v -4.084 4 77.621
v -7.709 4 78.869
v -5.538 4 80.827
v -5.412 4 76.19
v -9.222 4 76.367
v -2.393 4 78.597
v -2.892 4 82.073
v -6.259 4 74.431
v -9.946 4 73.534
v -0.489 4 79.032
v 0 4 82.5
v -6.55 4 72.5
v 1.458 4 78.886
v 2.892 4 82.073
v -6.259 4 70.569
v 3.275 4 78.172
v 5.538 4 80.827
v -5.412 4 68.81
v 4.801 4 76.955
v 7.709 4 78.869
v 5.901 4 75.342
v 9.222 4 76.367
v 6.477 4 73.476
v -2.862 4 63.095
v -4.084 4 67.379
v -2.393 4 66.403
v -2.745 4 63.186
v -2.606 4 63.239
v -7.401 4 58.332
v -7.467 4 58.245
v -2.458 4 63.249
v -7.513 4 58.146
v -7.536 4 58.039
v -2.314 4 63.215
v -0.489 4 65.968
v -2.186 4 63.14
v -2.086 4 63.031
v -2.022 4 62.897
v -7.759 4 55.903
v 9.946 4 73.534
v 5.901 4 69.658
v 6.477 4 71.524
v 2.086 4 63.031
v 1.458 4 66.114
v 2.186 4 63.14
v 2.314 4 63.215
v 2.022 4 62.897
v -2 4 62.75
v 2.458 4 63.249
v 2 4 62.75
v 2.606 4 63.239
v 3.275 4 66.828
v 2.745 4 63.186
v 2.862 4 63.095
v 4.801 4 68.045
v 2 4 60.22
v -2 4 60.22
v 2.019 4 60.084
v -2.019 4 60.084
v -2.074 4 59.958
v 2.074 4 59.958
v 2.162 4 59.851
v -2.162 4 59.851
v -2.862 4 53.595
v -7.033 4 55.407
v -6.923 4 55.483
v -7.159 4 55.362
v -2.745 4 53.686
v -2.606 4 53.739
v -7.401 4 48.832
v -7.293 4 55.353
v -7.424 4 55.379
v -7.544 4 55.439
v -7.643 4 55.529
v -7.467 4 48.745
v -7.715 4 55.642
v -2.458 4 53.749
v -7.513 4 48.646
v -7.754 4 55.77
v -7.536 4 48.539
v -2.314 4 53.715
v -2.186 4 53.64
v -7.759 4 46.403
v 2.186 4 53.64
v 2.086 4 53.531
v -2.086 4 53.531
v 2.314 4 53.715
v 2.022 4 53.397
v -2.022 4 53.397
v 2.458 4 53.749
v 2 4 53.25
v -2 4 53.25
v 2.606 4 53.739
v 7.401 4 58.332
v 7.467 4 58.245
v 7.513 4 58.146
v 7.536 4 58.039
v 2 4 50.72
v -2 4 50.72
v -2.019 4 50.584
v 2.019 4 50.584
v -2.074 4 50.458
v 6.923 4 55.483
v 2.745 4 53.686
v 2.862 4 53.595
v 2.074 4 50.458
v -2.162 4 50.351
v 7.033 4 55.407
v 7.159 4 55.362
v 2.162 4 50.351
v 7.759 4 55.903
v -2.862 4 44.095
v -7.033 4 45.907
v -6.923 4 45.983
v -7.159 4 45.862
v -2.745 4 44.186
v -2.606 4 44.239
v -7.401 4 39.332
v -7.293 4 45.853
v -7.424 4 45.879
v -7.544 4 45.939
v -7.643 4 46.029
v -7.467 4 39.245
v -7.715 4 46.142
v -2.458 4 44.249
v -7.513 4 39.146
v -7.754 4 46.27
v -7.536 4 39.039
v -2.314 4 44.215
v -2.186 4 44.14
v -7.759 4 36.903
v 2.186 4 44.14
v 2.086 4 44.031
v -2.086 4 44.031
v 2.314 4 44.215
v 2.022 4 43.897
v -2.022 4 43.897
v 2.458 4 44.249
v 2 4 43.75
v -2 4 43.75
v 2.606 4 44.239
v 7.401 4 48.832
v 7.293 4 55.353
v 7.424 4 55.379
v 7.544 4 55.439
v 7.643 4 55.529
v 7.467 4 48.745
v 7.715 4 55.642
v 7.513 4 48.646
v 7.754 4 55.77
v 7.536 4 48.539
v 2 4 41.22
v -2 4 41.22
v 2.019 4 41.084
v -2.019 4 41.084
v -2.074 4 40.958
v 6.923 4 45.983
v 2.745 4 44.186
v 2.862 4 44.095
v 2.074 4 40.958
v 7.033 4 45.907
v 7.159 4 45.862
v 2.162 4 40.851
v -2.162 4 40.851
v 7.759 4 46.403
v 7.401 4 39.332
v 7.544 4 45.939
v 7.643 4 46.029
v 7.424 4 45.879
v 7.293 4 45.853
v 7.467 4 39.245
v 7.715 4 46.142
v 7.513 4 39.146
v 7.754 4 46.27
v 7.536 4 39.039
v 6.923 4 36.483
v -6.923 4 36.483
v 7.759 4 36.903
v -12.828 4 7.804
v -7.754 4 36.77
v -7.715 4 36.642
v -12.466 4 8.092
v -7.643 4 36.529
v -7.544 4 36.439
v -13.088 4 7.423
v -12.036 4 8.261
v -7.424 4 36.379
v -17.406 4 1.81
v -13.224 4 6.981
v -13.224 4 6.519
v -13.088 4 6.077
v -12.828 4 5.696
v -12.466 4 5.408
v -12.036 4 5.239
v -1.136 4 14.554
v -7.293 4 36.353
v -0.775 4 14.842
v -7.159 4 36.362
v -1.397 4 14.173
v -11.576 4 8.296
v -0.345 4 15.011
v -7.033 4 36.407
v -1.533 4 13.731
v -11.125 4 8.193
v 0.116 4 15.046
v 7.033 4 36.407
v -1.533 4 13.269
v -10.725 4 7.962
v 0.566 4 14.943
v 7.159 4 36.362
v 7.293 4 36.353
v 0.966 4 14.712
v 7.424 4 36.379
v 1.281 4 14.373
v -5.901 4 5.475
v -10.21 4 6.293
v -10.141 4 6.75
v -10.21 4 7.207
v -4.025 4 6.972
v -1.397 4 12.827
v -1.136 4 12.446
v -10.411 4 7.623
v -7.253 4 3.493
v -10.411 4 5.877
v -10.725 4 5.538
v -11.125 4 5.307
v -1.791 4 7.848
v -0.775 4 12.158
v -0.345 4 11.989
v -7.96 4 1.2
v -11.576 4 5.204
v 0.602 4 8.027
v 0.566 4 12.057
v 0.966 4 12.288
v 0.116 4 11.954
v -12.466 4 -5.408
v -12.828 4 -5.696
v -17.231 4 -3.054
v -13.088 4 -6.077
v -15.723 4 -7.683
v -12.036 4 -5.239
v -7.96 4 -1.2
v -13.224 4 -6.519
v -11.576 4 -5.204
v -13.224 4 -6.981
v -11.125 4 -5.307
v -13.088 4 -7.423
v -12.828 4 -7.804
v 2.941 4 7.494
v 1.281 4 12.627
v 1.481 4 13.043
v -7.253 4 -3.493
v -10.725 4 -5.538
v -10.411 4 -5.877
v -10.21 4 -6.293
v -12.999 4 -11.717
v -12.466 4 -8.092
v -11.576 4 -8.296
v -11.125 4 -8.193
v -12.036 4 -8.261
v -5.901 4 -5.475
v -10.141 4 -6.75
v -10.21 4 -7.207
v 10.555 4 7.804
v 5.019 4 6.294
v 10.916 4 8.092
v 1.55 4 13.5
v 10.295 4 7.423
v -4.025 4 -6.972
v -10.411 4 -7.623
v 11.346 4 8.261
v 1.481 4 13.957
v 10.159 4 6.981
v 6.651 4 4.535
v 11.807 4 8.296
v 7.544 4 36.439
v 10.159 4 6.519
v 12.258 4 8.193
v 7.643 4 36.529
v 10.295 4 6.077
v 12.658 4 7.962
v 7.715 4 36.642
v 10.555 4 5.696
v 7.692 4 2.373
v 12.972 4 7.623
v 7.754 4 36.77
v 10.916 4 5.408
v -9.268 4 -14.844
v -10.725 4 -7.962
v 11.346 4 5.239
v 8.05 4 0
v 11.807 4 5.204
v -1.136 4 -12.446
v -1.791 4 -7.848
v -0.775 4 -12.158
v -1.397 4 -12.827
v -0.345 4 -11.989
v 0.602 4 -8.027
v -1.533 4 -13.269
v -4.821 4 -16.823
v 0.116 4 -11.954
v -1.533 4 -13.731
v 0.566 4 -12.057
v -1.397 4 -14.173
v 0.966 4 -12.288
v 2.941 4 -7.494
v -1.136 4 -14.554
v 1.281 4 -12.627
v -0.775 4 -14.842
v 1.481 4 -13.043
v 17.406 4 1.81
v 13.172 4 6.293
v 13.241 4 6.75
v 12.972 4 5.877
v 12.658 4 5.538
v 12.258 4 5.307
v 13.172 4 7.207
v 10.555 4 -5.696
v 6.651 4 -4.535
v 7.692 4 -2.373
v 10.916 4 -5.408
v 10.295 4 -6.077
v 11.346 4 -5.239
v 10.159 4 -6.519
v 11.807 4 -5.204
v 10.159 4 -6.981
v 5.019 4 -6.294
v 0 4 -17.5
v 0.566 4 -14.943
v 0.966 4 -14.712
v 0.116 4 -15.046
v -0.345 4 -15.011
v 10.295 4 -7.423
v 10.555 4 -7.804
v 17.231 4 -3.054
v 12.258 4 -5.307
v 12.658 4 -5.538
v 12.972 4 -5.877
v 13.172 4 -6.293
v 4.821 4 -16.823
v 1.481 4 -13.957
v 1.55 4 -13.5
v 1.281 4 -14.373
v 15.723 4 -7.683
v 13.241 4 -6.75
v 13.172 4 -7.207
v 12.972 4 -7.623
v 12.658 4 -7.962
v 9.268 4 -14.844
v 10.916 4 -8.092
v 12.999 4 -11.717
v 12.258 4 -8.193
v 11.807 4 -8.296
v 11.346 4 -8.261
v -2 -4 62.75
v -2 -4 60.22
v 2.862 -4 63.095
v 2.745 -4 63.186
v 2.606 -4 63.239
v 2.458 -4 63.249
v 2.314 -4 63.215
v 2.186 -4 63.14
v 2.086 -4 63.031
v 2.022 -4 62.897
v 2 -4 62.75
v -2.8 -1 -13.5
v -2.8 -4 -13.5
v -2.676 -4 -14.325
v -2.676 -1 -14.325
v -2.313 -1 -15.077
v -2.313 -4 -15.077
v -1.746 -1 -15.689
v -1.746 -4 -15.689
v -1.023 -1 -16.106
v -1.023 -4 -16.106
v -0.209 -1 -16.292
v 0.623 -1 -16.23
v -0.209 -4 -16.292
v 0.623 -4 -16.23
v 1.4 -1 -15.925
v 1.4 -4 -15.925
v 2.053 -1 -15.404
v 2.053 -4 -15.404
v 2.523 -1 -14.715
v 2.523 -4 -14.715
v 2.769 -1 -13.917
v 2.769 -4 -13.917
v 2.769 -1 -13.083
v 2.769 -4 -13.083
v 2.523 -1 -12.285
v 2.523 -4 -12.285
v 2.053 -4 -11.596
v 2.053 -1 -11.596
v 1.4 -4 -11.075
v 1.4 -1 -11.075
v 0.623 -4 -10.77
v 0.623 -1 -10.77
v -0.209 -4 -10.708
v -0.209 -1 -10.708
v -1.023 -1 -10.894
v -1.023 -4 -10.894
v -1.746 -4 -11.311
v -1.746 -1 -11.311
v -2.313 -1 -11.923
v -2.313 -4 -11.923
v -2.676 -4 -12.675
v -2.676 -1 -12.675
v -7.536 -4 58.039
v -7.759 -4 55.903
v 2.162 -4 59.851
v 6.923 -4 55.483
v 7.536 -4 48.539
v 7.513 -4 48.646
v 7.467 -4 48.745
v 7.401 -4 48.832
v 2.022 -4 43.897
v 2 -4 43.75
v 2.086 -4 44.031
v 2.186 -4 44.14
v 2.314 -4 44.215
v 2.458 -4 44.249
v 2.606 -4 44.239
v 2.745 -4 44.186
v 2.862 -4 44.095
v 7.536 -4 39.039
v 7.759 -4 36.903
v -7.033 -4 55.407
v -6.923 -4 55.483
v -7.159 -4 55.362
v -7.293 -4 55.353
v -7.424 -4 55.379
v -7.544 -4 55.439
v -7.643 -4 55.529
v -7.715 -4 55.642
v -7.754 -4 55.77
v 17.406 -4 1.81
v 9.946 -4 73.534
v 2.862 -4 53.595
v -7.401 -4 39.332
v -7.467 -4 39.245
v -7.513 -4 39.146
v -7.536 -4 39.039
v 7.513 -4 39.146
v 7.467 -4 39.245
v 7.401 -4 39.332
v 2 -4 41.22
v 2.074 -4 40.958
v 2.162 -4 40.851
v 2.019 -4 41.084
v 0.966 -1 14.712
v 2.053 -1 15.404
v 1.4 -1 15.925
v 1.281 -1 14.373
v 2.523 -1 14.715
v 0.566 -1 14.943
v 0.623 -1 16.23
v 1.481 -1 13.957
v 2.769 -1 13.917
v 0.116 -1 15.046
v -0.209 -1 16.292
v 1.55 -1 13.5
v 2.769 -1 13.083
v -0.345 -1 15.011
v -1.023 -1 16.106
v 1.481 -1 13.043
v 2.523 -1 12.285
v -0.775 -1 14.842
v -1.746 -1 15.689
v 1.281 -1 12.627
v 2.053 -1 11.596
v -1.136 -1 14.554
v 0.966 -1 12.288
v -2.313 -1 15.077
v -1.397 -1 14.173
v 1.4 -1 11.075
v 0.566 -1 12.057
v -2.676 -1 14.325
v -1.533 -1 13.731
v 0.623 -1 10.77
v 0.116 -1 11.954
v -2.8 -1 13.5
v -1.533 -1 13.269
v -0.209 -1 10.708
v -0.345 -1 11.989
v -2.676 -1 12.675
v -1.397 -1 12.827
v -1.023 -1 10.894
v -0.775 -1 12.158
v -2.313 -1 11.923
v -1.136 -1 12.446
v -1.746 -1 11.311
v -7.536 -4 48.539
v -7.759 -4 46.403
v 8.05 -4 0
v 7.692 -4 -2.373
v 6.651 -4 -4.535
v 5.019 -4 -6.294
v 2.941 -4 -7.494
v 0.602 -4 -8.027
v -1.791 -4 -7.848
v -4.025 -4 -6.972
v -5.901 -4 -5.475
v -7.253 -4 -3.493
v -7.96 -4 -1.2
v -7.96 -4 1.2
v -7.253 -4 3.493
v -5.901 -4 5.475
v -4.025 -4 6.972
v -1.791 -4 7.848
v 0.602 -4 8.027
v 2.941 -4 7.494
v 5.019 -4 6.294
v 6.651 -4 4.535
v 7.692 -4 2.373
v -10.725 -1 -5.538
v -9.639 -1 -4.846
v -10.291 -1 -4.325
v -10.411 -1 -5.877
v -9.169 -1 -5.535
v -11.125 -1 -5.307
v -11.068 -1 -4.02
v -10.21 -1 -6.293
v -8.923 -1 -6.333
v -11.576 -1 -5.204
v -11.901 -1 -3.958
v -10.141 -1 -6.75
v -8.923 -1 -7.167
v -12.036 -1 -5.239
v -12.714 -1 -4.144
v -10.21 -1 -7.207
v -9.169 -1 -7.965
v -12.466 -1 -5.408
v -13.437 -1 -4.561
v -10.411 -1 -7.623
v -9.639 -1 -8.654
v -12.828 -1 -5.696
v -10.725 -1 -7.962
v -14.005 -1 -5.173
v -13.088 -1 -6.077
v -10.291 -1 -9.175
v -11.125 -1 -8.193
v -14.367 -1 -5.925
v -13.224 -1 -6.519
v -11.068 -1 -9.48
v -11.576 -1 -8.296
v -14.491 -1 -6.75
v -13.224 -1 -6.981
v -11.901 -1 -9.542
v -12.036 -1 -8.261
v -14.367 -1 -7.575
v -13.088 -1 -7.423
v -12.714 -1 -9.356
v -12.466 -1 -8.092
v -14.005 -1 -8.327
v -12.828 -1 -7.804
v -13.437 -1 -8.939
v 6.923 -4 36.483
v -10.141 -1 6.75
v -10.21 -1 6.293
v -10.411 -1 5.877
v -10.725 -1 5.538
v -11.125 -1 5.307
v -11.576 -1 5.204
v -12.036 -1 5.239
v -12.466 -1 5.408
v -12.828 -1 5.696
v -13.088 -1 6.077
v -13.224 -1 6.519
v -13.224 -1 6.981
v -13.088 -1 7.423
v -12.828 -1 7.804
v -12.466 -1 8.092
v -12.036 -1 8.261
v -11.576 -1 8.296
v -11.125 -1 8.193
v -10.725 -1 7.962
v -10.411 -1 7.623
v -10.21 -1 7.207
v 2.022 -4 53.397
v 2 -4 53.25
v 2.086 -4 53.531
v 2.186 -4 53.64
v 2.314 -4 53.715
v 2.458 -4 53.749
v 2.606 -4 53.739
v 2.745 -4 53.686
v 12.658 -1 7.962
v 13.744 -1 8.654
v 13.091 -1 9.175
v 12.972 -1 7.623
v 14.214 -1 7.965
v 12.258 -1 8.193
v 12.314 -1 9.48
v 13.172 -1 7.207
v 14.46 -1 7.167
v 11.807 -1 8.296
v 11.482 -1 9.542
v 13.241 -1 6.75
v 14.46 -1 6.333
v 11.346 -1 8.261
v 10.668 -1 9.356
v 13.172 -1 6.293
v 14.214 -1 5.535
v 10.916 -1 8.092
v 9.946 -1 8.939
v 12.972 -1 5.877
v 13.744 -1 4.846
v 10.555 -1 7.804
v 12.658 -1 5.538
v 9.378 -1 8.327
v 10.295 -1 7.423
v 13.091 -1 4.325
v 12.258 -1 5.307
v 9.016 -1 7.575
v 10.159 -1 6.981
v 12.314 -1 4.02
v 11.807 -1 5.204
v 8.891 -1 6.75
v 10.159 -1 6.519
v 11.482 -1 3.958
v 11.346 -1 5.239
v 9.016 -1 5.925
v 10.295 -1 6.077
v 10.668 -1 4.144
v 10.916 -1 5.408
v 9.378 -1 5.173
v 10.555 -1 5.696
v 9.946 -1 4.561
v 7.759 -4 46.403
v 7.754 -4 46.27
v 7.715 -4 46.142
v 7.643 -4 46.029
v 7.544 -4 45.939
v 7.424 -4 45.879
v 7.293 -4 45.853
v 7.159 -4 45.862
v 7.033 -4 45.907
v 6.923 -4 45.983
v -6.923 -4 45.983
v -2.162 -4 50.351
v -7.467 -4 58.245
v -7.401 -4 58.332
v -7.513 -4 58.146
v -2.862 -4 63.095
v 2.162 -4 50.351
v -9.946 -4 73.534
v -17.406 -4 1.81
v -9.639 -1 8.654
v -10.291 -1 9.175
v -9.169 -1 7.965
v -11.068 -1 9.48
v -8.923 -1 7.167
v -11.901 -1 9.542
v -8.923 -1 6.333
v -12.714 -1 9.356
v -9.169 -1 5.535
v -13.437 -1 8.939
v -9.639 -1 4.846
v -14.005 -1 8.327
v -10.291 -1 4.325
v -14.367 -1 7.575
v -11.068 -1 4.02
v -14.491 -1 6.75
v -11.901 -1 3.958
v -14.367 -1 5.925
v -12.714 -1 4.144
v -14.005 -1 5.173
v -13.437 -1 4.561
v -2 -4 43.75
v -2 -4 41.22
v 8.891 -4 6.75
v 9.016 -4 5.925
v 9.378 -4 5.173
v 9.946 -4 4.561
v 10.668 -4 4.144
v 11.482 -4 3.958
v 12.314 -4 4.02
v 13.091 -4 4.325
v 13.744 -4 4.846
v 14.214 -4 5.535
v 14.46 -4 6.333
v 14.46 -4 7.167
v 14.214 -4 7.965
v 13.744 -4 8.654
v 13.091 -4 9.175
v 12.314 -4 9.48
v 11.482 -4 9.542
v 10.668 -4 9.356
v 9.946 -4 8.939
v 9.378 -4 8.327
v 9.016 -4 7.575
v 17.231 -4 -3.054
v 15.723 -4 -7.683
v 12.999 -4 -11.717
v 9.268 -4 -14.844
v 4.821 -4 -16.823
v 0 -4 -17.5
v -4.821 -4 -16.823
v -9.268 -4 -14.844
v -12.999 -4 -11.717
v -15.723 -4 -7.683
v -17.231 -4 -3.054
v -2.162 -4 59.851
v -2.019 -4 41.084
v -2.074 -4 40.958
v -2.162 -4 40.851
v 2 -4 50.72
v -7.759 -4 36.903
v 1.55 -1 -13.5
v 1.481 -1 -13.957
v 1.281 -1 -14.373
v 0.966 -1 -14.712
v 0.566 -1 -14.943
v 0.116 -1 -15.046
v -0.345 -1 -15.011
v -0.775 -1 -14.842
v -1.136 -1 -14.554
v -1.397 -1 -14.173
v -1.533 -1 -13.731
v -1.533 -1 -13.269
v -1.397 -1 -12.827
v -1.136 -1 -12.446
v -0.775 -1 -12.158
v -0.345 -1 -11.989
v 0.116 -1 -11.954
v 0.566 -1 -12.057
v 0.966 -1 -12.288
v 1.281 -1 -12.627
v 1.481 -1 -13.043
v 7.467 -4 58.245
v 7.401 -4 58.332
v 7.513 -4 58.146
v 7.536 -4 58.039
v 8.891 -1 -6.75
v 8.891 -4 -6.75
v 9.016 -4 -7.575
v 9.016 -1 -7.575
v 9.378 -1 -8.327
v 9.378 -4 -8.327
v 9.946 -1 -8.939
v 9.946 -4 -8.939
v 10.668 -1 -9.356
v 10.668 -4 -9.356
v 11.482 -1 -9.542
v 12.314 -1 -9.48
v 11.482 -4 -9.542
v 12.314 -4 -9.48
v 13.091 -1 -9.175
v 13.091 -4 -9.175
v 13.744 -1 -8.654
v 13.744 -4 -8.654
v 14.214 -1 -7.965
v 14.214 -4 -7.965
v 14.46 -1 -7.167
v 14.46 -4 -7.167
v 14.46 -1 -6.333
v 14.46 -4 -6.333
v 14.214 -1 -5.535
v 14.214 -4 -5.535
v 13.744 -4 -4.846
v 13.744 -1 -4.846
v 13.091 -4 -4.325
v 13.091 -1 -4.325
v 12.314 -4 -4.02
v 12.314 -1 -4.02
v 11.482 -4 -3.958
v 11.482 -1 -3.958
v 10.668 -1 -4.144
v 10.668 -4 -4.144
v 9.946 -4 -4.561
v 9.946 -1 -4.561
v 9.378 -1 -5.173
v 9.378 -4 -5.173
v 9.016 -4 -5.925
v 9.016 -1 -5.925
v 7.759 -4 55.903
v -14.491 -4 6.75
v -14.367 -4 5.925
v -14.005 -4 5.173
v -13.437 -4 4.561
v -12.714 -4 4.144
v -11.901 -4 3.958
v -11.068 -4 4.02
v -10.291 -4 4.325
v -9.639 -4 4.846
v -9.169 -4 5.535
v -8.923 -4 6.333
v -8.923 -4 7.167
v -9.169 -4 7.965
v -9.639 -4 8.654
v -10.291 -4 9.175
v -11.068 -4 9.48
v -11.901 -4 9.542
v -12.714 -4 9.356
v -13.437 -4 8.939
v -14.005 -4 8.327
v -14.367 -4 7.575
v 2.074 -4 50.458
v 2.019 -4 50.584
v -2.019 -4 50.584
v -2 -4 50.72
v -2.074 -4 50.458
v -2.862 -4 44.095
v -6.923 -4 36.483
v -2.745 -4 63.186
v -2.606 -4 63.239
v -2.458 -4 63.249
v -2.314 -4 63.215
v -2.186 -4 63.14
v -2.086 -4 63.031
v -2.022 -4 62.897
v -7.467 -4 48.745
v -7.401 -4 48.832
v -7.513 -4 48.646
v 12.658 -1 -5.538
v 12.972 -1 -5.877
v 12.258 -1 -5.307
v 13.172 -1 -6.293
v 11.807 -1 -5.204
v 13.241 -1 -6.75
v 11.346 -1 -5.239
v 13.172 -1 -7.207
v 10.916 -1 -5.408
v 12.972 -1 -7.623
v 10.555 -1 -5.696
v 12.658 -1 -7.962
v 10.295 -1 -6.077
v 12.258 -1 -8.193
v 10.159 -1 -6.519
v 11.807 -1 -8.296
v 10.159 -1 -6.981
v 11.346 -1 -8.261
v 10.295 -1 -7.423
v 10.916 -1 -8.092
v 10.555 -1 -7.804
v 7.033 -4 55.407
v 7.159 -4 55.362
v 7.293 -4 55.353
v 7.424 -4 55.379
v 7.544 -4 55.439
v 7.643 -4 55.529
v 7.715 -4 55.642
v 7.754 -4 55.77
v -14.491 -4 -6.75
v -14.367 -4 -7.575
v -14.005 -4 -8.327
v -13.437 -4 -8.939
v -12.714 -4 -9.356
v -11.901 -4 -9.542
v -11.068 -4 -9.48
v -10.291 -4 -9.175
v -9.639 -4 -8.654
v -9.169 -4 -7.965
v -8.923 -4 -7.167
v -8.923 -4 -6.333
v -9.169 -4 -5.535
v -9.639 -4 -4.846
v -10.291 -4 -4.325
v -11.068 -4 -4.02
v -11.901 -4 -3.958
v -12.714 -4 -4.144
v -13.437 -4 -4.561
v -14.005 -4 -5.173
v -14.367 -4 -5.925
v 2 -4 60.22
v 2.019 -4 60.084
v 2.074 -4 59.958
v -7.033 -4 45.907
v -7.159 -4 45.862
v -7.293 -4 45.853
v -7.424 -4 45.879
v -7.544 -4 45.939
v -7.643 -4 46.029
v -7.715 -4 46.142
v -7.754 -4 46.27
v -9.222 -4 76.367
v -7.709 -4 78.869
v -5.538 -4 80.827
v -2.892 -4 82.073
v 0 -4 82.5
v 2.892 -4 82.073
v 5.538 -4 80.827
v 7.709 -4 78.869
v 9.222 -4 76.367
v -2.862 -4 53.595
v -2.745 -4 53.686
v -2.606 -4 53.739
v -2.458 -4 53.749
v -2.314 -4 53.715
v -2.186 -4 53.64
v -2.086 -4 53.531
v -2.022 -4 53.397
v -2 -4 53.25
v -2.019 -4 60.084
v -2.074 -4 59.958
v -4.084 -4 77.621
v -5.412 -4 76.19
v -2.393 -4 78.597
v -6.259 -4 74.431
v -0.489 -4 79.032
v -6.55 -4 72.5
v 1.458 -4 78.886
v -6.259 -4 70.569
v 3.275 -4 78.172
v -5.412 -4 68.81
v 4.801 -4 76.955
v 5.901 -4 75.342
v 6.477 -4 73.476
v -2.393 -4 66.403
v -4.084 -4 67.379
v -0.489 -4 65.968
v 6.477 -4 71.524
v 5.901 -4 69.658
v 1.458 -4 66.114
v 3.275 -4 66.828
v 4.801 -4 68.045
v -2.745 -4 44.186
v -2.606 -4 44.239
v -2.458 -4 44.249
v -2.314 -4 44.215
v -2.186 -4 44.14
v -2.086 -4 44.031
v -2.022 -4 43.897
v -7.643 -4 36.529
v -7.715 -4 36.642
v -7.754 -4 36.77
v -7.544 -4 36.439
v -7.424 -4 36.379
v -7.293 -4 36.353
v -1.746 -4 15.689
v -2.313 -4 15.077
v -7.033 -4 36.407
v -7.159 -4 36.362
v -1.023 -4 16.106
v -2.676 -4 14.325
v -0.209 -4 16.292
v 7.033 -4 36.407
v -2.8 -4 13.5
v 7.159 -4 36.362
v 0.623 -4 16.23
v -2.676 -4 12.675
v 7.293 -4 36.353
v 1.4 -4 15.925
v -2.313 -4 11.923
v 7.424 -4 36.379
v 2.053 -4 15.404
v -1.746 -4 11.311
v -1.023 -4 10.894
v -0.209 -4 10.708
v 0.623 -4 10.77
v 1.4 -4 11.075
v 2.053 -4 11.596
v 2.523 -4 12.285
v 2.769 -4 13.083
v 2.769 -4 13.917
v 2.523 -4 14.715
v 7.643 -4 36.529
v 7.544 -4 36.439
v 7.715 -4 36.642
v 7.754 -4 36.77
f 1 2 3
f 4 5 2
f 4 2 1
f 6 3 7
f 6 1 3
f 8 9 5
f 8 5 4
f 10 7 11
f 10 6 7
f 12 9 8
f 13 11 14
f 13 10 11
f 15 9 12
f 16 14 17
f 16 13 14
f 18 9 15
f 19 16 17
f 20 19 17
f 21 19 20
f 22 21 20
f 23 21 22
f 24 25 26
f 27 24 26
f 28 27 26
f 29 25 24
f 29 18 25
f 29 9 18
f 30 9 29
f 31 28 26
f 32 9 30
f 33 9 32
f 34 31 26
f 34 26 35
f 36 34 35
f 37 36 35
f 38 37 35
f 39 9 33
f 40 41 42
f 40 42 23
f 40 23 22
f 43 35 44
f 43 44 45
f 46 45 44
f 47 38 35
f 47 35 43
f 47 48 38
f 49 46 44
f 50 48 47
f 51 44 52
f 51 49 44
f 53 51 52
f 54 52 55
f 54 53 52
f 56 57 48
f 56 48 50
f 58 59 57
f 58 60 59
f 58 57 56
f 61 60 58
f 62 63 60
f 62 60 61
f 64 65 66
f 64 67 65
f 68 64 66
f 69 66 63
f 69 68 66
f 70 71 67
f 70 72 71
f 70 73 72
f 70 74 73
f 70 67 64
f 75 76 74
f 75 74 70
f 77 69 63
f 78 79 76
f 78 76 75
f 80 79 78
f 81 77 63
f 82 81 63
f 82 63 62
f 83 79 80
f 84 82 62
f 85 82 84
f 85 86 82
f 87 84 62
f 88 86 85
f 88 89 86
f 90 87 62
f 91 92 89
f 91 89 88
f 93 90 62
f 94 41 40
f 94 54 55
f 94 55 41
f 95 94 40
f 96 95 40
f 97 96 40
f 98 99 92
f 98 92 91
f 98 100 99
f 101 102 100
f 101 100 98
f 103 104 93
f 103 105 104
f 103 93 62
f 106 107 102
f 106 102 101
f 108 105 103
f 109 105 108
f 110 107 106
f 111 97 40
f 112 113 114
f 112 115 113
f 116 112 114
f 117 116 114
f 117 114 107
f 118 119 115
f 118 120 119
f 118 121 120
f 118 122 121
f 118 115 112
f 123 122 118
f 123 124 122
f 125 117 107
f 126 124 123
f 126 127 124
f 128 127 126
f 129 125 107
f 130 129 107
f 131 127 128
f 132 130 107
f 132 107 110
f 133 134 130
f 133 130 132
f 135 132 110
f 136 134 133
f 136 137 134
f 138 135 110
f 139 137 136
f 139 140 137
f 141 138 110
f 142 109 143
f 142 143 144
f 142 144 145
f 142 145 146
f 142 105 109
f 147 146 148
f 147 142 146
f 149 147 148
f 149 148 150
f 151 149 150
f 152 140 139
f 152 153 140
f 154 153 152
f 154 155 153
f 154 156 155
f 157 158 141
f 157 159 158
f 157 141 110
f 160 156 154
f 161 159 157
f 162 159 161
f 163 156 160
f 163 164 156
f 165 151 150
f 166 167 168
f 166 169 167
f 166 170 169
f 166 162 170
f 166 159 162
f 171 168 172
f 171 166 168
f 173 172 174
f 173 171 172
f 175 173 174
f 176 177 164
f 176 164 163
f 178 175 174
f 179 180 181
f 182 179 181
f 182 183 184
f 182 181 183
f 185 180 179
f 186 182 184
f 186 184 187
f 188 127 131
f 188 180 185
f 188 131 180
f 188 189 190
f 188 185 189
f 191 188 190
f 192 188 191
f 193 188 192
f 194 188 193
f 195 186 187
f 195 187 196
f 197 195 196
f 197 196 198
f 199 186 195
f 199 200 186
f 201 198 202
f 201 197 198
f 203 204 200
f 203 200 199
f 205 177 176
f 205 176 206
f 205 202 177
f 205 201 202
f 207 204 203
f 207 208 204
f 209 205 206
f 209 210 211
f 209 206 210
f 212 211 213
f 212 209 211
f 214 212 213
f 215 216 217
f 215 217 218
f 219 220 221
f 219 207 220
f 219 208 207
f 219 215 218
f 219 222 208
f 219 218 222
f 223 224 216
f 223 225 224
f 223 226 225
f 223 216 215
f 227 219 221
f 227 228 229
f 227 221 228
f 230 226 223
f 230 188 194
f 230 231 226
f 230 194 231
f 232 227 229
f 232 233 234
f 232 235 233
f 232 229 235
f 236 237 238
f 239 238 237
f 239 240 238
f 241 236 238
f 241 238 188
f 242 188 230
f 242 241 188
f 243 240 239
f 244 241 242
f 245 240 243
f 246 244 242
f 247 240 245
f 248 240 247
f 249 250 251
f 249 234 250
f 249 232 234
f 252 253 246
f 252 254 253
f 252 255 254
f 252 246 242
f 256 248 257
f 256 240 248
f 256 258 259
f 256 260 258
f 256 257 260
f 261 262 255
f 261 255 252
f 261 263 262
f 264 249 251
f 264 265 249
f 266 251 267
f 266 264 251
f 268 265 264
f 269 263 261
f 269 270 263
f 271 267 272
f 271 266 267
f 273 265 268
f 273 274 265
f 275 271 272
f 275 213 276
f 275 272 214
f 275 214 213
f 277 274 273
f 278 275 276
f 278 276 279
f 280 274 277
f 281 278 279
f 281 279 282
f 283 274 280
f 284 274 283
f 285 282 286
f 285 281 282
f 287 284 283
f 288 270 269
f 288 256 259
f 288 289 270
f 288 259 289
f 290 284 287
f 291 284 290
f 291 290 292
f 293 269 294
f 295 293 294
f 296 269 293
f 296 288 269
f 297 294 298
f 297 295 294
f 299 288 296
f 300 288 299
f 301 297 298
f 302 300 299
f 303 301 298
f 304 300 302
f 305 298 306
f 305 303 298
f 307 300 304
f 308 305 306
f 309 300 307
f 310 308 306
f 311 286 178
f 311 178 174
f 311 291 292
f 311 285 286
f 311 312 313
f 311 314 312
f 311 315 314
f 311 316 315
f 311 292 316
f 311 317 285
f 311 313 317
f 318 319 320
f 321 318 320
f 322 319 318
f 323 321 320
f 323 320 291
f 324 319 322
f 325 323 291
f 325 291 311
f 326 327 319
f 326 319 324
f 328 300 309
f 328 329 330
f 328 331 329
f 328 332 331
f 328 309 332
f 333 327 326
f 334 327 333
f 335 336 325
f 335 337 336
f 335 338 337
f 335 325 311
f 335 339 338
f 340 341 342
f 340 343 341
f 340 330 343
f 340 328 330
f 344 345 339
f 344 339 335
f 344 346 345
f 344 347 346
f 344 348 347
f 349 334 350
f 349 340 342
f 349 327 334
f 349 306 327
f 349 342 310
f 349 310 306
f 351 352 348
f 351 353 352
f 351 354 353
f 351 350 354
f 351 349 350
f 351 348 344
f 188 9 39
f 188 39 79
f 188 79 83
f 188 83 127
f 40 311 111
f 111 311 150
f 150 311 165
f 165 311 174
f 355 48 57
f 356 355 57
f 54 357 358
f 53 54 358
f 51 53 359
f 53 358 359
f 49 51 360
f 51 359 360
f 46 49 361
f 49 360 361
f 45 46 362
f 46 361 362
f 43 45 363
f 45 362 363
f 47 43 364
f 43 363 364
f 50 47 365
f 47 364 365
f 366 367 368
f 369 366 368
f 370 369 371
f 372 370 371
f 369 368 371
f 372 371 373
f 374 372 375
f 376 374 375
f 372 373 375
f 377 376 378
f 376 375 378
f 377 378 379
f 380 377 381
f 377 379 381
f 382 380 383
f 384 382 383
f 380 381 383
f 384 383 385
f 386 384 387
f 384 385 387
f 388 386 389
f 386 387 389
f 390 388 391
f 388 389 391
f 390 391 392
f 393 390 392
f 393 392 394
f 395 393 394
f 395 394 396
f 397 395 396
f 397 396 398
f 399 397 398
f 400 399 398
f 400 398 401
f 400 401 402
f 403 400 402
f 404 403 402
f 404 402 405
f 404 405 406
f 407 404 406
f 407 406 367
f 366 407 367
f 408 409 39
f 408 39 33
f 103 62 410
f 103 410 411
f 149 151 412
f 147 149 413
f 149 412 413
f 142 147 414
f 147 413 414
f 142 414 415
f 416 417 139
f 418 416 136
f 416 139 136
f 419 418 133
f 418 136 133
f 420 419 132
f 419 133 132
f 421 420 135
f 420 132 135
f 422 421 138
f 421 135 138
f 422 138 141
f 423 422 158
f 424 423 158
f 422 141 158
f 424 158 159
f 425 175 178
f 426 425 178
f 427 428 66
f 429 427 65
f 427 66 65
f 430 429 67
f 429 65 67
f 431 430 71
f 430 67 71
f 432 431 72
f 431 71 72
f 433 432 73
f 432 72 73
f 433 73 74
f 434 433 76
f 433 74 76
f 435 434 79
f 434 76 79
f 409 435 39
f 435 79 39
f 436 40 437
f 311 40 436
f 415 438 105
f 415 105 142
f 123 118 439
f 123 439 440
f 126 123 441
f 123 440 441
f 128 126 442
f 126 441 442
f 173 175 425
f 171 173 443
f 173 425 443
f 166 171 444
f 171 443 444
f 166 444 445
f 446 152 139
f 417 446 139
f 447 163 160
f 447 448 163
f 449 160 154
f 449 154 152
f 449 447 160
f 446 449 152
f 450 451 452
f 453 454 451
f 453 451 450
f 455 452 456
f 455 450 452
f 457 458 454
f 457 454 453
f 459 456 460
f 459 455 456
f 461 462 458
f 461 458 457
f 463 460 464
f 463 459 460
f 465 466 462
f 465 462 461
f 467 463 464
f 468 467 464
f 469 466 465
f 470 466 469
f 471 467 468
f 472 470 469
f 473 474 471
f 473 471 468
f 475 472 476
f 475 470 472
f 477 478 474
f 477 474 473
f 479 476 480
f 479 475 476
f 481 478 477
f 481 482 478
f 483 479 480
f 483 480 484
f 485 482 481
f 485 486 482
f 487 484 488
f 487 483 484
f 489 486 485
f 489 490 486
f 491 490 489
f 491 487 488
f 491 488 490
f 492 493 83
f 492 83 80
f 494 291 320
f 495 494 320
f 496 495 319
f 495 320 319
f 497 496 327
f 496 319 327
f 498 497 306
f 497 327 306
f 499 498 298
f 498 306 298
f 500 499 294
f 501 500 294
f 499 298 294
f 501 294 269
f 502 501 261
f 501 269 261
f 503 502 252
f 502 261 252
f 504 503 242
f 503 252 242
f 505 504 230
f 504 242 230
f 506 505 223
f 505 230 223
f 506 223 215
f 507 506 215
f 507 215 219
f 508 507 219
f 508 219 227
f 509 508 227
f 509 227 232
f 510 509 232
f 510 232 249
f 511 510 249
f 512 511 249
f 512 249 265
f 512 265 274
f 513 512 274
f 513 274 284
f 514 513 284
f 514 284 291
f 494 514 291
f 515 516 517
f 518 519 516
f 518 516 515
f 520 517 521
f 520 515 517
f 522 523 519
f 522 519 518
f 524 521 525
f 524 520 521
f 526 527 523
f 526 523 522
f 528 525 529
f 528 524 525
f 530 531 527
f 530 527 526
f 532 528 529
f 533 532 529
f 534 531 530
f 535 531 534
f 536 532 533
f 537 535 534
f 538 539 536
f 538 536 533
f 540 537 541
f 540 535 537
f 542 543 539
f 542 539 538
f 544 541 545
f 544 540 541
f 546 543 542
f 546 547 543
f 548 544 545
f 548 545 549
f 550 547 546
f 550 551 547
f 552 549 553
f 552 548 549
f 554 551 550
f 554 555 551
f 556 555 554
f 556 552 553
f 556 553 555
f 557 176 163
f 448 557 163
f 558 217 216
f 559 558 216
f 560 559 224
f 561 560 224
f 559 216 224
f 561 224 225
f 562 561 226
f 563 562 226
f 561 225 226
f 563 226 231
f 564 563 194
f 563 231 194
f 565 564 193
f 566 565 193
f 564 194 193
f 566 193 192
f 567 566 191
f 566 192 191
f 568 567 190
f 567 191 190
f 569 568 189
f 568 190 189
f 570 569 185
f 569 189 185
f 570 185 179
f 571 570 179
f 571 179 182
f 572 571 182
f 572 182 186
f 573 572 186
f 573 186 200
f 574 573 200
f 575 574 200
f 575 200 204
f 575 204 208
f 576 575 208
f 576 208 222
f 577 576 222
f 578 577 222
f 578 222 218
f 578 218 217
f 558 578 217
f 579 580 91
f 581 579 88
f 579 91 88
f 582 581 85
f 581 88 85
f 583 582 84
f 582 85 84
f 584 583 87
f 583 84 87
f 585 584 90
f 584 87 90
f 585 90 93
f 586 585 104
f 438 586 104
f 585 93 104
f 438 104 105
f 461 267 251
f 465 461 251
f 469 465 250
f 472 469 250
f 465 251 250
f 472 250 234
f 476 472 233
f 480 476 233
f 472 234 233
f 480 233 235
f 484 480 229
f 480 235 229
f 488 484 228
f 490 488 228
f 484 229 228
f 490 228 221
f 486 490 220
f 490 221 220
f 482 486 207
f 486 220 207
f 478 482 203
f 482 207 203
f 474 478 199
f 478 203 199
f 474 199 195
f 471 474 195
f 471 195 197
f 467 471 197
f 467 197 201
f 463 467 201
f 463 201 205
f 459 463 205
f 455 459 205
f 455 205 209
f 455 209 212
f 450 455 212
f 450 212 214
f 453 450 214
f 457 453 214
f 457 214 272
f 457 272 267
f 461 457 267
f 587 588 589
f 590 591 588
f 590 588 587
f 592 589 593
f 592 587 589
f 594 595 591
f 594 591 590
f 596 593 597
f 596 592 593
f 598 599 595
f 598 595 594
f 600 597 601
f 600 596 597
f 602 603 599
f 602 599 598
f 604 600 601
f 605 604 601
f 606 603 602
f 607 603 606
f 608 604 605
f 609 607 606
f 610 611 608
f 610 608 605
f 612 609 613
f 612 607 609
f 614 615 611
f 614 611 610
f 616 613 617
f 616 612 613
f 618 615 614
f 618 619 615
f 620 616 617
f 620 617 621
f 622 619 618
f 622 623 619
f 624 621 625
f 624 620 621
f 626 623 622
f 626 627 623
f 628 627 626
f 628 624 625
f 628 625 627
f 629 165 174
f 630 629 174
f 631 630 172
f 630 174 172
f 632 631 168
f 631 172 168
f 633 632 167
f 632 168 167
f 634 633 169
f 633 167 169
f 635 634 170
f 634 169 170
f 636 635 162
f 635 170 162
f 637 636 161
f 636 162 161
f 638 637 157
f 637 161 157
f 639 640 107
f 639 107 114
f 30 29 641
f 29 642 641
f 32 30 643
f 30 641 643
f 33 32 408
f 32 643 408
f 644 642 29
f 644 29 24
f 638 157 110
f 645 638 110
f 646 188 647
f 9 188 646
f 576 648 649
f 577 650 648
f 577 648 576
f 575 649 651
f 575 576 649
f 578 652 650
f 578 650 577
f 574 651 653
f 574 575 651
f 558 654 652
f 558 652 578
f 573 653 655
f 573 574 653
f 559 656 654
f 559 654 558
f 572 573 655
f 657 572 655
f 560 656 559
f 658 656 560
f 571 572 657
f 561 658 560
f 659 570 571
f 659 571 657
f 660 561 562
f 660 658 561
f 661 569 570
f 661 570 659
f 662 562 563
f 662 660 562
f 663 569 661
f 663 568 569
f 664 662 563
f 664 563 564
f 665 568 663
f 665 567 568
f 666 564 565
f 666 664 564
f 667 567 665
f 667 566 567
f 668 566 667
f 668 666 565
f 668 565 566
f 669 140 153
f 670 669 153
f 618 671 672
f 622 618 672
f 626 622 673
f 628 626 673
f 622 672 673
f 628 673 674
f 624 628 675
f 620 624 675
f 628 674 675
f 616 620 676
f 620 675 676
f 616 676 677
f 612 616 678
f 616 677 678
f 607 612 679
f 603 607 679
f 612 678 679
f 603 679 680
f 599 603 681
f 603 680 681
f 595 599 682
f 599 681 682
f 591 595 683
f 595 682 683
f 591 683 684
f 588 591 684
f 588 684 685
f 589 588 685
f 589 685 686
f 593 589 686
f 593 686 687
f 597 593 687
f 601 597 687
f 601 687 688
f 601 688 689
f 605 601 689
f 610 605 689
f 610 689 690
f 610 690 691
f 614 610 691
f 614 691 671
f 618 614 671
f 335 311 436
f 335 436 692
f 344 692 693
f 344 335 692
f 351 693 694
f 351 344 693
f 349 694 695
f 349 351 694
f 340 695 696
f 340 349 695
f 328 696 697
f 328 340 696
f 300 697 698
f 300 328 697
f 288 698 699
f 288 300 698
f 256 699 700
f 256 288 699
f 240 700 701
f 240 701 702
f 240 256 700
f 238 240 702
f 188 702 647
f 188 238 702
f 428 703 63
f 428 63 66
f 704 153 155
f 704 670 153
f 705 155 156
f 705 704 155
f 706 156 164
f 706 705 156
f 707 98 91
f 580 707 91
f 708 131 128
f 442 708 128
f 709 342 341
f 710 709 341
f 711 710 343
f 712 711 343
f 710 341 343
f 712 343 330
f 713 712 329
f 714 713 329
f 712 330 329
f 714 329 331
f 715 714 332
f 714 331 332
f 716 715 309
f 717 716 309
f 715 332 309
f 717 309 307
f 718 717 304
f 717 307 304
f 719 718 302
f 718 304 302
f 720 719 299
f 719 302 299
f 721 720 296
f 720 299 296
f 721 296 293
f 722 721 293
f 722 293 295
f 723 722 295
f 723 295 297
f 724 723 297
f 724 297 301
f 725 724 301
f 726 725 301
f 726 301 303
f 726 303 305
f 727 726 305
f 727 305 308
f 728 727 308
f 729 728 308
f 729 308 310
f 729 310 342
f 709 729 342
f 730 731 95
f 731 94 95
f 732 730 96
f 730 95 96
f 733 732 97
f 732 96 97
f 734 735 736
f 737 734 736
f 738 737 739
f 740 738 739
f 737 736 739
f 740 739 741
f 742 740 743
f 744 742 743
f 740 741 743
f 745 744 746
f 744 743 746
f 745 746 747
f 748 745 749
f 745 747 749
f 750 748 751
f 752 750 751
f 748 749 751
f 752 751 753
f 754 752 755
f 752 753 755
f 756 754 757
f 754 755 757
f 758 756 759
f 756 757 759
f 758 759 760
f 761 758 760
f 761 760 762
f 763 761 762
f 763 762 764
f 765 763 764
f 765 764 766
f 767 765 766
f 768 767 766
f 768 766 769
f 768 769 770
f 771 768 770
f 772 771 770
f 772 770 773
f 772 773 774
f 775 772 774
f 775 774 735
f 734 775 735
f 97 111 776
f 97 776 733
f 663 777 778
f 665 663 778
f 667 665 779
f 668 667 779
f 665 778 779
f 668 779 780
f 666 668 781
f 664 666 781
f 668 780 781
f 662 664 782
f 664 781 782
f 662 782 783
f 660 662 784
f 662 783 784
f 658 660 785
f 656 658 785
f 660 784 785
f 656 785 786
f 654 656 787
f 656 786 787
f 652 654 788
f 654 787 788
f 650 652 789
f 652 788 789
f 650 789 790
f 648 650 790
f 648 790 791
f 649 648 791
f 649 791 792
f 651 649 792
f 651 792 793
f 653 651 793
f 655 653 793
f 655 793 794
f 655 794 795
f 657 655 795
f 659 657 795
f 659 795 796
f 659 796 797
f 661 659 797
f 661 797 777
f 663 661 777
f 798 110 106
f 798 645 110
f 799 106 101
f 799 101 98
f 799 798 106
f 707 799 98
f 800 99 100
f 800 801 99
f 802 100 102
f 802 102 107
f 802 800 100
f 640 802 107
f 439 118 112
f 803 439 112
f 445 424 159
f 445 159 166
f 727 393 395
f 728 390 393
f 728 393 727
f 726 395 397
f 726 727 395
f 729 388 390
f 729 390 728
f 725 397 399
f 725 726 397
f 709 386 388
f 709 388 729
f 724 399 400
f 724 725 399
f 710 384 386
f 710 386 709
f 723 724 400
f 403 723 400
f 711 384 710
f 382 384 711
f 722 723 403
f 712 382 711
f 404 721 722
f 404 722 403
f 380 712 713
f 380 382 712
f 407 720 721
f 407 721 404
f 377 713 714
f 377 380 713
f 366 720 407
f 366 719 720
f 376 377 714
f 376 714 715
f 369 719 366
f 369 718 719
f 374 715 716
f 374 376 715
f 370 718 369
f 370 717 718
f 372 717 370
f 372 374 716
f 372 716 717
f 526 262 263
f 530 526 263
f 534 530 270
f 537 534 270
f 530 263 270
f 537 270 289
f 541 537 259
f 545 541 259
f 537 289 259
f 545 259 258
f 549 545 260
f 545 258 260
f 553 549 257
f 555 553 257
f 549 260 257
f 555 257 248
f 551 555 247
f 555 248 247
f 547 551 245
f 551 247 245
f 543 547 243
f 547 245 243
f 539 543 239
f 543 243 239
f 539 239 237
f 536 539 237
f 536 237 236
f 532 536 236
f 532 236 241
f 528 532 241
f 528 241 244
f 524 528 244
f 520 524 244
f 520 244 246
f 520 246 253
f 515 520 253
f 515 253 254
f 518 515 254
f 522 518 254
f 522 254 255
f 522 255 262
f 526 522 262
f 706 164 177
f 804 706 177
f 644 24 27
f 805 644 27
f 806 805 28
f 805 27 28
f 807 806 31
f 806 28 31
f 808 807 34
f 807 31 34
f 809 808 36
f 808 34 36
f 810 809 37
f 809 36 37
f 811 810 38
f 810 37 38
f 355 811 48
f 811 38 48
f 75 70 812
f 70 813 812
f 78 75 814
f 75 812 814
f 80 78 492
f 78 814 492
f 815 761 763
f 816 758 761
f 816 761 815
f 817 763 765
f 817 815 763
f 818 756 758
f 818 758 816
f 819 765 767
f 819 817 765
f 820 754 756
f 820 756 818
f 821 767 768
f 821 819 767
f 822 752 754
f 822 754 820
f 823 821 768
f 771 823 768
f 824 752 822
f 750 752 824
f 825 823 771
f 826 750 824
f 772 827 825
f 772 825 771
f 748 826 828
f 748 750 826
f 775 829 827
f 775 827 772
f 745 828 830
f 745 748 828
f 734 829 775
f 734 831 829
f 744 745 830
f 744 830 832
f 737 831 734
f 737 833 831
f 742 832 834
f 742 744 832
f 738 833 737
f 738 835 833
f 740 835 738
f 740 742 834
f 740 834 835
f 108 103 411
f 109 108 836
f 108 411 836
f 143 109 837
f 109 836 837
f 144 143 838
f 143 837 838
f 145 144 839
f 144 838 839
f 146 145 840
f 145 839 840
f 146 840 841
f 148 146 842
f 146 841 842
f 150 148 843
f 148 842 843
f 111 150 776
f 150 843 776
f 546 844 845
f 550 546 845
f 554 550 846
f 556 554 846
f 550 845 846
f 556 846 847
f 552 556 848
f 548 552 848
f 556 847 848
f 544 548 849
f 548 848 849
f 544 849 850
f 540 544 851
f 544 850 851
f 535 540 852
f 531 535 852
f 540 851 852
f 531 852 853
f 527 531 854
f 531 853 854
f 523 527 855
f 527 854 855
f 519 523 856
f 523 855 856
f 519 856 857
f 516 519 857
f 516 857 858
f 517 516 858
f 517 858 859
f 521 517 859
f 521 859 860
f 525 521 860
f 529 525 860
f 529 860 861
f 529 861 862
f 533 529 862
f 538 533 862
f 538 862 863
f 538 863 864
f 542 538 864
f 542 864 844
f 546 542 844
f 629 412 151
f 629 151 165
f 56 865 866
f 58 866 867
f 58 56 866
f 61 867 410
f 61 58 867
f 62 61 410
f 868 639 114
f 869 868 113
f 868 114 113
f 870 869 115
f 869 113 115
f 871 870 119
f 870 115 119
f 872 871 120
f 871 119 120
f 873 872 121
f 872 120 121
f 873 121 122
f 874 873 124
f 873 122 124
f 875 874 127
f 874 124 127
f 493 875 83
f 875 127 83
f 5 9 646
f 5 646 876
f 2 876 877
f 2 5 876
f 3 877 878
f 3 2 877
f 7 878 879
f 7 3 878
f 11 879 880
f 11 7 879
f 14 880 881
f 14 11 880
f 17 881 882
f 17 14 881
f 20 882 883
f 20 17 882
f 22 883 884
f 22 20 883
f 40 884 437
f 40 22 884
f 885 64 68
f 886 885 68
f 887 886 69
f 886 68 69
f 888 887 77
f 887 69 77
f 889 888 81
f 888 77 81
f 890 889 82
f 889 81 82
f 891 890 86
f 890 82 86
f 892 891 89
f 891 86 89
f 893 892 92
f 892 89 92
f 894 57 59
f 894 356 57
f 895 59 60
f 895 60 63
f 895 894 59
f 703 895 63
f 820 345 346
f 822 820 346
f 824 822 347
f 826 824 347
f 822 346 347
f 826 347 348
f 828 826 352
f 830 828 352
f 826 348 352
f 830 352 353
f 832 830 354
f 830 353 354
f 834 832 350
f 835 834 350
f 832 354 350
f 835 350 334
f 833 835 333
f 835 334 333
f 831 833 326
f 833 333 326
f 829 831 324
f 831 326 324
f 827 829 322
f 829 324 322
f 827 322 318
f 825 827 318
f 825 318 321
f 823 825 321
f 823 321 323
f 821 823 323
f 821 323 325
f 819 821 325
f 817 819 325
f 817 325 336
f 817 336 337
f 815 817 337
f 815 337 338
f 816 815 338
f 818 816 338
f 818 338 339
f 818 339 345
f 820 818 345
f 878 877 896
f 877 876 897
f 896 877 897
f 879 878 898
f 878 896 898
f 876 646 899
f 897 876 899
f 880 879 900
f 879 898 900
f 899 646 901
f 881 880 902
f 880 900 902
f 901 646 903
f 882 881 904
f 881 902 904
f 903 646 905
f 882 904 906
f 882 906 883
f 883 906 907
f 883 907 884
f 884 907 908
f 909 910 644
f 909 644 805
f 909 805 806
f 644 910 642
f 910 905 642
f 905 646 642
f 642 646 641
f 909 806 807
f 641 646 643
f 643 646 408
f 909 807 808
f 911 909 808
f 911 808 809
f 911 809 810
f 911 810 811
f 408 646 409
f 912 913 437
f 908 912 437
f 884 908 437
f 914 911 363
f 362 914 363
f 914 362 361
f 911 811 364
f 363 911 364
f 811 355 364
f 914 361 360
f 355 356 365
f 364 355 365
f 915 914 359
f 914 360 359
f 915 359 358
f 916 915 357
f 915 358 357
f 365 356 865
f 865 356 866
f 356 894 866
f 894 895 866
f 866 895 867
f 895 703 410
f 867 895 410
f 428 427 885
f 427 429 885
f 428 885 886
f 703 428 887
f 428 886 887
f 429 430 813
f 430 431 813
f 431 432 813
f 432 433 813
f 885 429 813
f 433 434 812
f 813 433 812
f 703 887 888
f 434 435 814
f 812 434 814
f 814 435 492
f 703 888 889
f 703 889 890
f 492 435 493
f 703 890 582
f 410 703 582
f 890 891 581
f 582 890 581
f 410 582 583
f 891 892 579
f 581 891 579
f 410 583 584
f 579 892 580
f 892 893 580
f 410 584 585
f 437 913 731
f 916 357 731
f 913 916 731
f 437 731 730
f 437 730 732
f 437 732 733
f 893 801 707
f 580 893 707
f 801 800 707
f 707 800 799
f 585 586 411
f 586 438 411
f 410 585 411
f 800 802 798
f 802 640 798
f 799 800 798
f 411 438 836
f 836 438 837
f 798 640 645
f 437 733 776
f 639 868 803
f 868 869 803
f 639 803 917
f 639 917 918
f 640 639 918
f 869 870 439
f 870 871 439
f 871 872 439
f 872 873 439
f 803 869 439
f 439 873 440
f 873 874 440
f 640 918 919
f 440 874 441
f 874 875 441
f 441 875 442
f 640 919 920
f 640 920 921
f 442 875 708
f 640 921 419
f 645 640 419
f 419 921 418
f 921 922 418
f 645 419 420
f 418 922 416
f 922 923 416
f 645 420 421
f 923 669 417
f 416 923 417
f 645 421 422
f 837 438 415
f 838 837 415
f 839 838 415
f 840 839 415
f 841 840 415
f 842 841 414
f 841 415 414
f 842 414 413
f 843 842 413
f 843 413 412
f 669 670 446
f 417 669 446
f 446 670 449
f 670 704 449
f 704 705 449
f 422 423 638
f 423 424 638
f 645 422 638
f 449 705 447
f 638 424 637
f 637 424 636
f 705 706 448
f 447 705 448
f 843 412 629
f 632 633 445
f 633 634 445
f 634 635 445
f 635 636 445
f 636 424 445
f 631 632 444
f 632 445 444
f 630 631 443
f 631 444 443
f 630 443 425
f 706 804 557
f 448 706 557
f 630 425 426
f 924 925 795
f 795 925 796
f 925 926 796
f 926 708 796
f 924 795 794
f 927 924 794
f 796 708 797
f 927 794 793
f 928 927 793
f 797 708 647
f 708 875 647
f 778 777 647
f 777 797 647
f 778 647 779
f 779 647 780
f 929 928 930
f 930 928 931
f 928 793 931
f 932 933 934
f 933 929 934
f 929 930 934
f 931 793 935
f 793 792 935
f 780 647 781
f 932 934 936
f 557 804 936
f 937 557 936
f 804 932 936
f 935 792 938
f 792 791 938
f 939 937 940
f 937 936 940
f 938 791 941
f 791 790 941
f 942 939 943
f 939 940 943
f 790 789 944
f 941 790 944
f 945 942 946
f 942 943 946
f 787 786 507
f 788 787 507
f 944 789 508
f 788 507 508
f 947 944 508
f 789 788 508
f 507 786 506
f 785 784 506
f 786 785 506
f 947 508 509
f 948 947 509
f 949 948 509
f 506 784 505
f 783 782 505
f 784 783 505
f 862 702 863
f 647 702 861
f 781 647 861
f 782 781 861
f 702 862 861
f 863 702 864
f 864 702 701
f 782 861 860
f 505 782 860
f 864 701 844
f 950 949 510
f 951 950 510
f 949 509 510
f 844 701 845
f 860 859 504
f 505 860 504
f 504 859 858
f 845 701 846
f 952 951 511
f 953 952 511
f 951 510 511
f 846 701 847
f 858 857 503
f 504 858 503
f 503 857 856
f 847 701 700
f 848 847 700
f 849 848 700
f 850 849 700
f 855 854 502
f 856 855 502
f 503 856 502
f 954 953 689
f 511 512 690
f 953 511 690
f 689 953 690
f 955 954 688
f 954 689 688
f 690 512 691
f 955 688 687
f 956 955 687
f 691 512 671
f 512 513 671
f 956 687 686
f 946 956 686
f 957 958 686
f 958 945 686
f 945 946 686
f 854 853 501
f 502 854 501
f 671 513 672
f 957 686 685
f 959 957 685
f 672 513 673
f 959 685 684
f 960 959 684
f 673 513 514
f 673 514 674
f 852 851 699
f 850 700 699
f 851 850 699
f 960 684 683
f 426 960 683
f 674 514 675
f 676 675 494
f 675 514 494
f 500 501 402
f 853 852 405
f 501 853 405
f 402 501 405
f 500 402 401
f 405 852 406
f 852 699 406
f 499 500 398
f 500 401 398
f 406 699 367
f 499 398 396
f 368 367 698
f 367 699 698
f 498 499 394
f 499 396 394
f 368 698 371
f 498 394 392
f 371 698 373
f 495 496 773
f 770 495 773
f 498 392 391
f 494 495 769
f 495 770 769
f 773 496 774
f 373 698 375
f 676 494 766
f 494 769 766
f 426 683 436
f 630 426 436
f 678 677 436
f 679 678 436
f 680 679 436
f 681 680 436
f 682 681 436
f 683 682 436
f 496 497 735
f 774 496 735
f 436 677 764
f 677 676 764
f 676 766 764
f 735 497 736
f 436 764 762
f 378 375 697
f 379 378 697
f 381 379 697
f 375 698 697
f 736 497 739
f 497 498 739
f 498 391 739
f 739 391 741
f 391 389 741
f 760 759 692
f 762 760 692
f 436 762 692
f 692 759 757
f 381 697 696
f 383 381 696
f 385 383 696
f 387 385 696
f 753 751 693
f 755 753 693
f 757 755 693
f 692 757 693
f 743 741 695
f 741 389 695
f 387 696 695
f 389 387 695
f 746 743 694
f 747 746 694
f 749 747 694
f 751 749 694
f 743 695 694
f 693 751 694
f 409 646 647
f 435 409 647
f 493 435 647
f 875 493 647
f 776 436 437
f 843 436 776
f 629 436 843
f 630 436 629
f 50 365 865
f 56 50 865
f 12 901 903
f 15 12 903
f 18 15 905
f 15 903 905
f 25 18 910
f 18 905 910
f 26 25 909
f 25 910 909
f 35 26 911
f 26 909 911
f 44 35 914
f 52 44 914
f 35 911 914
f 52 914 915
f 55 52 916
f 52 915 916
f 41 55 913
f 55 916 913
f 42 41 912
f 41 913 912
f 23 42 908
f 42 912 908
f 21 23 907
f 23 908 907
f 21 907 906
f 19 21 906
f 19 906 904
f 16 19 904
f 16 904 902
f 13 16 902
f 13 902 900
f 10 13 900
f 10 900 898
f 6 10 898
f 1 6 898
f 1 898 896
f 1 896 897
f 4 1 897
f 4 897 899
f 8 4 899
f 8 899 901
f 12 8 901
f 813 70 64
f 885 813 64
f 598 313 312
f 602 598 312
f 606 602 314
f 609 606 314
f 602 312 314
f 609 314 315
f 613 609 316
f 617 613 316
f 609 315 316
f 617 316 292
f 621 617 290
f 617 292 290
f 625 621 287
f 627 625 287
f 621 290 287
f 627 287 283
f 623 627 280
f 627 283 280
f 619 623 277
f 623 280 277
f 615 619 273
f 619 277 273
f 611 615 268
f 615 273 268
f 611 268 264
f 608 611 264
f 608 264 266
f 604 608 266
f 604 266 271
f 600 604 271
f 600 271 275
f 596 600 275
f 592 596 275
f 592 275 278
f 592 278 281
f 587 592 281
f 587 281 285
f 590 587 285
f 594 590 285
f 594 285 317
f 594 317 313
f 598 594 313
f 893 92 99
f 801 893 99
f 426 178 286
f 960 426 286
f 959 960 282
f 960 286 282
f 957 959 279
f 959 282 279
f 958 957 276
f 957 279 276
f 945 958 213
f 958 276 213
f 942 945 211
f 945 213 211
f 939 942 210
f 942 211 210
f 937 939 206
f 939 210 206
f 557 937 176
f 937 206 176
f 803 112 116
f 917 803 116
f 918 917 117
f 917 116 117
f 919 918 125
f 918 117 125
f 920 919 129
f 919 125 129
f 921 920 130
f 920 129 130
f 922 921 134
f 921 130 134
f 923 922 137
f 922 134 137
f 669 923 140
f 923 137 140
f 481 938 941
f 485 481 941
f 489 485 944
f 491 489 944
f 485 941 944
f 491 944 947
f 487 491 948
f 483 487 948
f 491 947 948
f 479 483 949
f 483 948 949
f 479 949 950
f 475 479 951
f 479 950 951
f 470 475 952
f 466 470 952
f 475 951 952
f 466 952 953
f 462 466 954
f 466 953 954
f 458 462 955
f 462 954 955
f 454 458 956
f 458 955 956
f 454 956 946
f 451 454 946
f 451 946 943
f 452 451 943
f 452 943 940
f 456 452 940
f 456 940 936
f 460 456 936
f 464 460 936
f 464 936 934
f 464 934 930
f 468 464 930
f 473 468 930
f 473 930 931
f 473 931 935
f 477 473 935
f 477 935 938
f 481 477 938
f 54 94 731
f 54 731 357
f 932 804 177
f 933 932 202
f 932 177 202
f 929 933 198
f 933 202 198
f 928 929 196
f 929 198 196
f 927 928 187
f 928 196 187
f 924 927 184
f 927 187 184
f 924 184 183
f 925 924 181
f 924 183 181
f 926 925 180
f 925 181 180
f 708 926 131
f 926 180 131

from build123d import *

# Parameters (mm, degrees)
EXTRUDE_1_DEPTH                = 8
CUT_EXTRUDE_1_DEPTH            = 9
CUT_EXTRUDE_2_DEPTH            = 9
CUT_EXTRUDE_3_DEPTH            = 9
CUT_EXTRUDE_4_DEPTH            = 9
CUT_EXTRUDE_5_DEPTH            = 9
CUT_EXTRUDE_6_DEPTH            = 9
HOLE_WIZARD_16_0_16_1_D        = 16.1
HOLE_WIZARD_16_0_16_1_DEPTH    = 8
HOLE_WIZARD_13_0_13_1_D        = 13.1
HOLE_WIZARD_13_0_13_1_DEPTH    = 8
HOLE_WIZARD_M2_5_1_D           = 3.1
HOLE_WIZARD_M2_5_1_DEPTH       = 8
HOLE_WIZARD_M2_5_1_CBORE_D     = 5.6
HOLE_WIZARD_M2_5_1_CBORE_DEPTH = 3
FILLET_1_R                     = 0.5


with BuildPart() as part:
    # 草图1 → 凸台-拉伸1 (new body)
    with BuildSketch(Plane(origin=(0, 4, 0), x_dir=(1, 0, 0), z_dir=(0, 1, 0))):
        with BuildLine():
            Line((-17.406109606, -1.810344828), (-9.946348346, -73.534482759))
            ThreePointArc((-9.946348346, -73.534482759), (0, -82.5), (9.946348346, -73.534482759))
            Line((9.946348346, -73.534482759), (17.406109606, -1.810344828))
            ThreePointArc((17.406109606, -1.810344828), (0, 17.5), (-17.406109606, -1.810344828))
        make_face()
    extrude(amount=-EXTRUDE_1_DEPTH)

    # 草图2 → 切除-拉伸1 (cut, through all)
    with BuildSketch(Plane(origin=(0, 4, 0), x_dir=(-1, 0, 0), z_dir=(0, 1, 0))):
        with BuildLine():
            Line((2, 43.750482659), (2, 41))
            Line((2, 41), (6.923179382, 36.483241979))
            ThreePointArc((6.923179382, 36.483241979), (7.485869271, 36.40499598), (7.758515386, 36.903399876))
            Line((7.758515386, 36.903399876), (7.518784371, 39.208366459))
            Line((7.518784371, 39.208366459), (2.861977096, 44.095406683))
            ThreePointArc((2.861977096, 44.095406683), (2.314242831, 44.214696268), (2, 43.750482659))
        make_face()
    extrude(amount=-CUT_EXTRUDE_1_DEPTH, mode=Mode.SUBTRACT)

    # 草图3 → 切除-拉伸2 (cut, through all)
    with BuildSketch(Plane(origin=(0, 4, 0), x_dir=(-1, 0, 0), z_dir=(0, 1, 0))):
        with BuildLine():
            Line((-6.923179382, 36.483241979), (-2, 41))
            Line((-2, 41), (-2, 43.750482659))
            ThreePointArc((-2, 43.750482659), (-2.314242831, 44.214696268), (-2.861977096, 44.095406683))
            Line((-2.861977096, 44.095406683), (-7.518784371, 39.208366459))
            Line((-7.518784371, 39.208366459), (-7.758515386, 36.903399876))
            ThreePointArc((-7.758515386, 36.903399876), (-7.485869271, 36.40499598), (-6.923179382, 36.483241979))
        make_face()
    extrude(amount=-CUT_EXTRUDE_2_DEPTH, mode=Mode.SUBTRACT)

    # 草图4 → 切除-拉伸3 (cut, through all)
    with BuildSketch(Plane(origin=(0, 4, 0), x_dir=(-1, 0, 0), z_dir=(0, 1, 0))):
        with BuildLine():
            Line((2, 53.250482659), (2, 50.5))
            Line((2, 50.5), (6.923179382, 45.983241979))
            ThreePointArc((6.923179382, 45.983241979), (7.485869271, 45.90499598), (7.758515386, 46.403399876))
            Line((7.758515386, 46.403399876), (7.518784371, 48.708366459))
            Line((7.518784371, 48.708366459), (2.861977096, 53.595406683))
            ThreePointArc((2.861977096, 53.595406683), (2.314242831, 53.714696268), (2, 53.250482659))
        make_face()
    extrude(amount=-CUT_EXTRUDE_3_DEPTH, mode=Mode.SUBTRACT)

    # 草图5 → 切除-拉伸4 (cut, through all)
    with BuildSketch(Plane(origin=(0, 4, 0), x_dir=(-1, 0, 0), z_dir=(0, 1, 0))):
        with BuildLine():
            Line((-6.923179382, 45.983241979), (-2, 50.5))
            Line((-2, 50.5), (-2, 53.250482659))
            ThreePointArc((-2, 53.250482659), (-2.314242831, 53.714696268), (-2.861977096, 53.595406683))
            Line((-2.861977096, 53.595406683), (-7.518784371, 48.708366459))
            Line((-7.518784371, 48.708366459), (-7.758515386, 46.403399876))
            ThreePointArc((-7.758515386, 46.403399876), (-7.485869271, 45.90499598), (-6.923179382, 45.983241979))
        make_face()
    extrude(amount=-CUT_EXTRUDE_4_DEPTH, mode=Mode.SUBTRACT)

    # 草图6 → 切除-拉伸5 (cut, through all)
    with BuildSketch(Plane(origin=(0, 4, 0), x_dir=(-1, 0, 0), z_dir=(0, 1, 0))):
        with BuildLine():
            Line((2, 62.750482659), (2, 60))
            Line((2, 60), (6.923179382, 55.483241979))
            ThreePointArc((6.923179382, 55.483241979), (7.485869271, 55.40499598), (7.758515386, 55.903399876))
            Line((7.758515386, 55.903399876), (7.518784371, 58.208366459))
            Line((7.518784371, 58.208366459), (2.861977096, 63.095406683))
            ThreePointArc((2.861977096, 63.095406683), (2.314242831, 63.214696268), (2, 62.750482659))
        make_face()
    extrude(amount=-CUT_EXTRUDE_5_DEPTH, mode=Mode.SUBTRACT)

    # 草图7 → 切除-拉伸6 (cut, through all)
    with BuildSketch(Plane.XZ.offset(4)):
        with BuildLine():
            Line((2, 62.750482659), (2, 60))
            Line((2, 60), (6.923179382, 55.483241979))
            ThreePointArc((6.923179382, 55.483241979), (7.485869271, 55.40499598), (7.758515386, 55.903399876))
            Line((7.758515386, 55.903399876), (7.518784371, 58.208366459))
            Line((7.518784371, 58.208366459), (2.861977096, 63.095406683))
            ThreePointArc((2.861977096, 63.095406683), (2.314242831, 63.214696268), (2, 62.750482659))
        make_face()
    extrude(amount=-CUT_EXTRUDE_6_DEPTH, mode=Mode.SUBTRACT)

    # Ø16.0 (16) 直径孔1
    with Locations(Plane(origin=(0, -4, 0), x_dir=(-1, 0, 0), z_dir=(0, -1, 0))):
        with Locations((0, 0)):
            Hole(HOLE_WIZARD_16_0_16_1_D / 2, depth=HOLE_WIZARD_16_0_16_1_DEPTH)

    # Ø13.0 (13) 直径孔1
    with Locations(Plane(origin=(0, 4, 0), x_dir=(1, 0, 0), z_dir=(0, 1, 0))):
        with Locations((0, -72.5)):
            Hole(HOLE_WIZARD_13_0_13_1_D / 2, depth=HOLE_WIZARD_13_0_13_1_DEPTH)

    # M2.5 六角头机械螺钉的柱形沉头孔1
    with Locations(Plane(origin=(0, -4, 0), x_dir=(-1, 0, 0), z_dir=(0, -1, 0))):
        with Locations((11.691342951, -6.75), (11.691342951, 6.75), (0, 13.5), (-11.691342951, 6.75), (-11.691342951, -6.75), (0, -13.5)):
            CounterBoreHole(HOLE_WIZARD_M2_5_1_D / 2, HOLE_WIZARD_M2_5_1_CBORE_D / 2, HOLE_WIZARD_M2_5_1_CBORE_DEPTH, depth=HOLE_WIZARD_M2_5_1_DEPTH)

    # 圆角1
    fillet_1_edges = [part.edges().sort_by_distance(p)[0] for p in [
        (-7.518784371, 0, 58.208366459),
        (-2, 0, 60),
        (7.518784371, 0, 58.208366459),
        (2, 0, 60),
        (-7.518784371, 0, 39.208366459),
        (-2, 0, 41),
        (7.518784371, 0, 39.208366459),
        (2, 0, 41),
        (-7.518784371, 0, 48.708366459),
        (-2, 0, 50.5),
        (7.518784371, 0, 48.708366459),
        (2, 0, 50.5),
    ]]
    fillet(fillet_1_edges, radius=FILLET_1_R)


solid = part.part
